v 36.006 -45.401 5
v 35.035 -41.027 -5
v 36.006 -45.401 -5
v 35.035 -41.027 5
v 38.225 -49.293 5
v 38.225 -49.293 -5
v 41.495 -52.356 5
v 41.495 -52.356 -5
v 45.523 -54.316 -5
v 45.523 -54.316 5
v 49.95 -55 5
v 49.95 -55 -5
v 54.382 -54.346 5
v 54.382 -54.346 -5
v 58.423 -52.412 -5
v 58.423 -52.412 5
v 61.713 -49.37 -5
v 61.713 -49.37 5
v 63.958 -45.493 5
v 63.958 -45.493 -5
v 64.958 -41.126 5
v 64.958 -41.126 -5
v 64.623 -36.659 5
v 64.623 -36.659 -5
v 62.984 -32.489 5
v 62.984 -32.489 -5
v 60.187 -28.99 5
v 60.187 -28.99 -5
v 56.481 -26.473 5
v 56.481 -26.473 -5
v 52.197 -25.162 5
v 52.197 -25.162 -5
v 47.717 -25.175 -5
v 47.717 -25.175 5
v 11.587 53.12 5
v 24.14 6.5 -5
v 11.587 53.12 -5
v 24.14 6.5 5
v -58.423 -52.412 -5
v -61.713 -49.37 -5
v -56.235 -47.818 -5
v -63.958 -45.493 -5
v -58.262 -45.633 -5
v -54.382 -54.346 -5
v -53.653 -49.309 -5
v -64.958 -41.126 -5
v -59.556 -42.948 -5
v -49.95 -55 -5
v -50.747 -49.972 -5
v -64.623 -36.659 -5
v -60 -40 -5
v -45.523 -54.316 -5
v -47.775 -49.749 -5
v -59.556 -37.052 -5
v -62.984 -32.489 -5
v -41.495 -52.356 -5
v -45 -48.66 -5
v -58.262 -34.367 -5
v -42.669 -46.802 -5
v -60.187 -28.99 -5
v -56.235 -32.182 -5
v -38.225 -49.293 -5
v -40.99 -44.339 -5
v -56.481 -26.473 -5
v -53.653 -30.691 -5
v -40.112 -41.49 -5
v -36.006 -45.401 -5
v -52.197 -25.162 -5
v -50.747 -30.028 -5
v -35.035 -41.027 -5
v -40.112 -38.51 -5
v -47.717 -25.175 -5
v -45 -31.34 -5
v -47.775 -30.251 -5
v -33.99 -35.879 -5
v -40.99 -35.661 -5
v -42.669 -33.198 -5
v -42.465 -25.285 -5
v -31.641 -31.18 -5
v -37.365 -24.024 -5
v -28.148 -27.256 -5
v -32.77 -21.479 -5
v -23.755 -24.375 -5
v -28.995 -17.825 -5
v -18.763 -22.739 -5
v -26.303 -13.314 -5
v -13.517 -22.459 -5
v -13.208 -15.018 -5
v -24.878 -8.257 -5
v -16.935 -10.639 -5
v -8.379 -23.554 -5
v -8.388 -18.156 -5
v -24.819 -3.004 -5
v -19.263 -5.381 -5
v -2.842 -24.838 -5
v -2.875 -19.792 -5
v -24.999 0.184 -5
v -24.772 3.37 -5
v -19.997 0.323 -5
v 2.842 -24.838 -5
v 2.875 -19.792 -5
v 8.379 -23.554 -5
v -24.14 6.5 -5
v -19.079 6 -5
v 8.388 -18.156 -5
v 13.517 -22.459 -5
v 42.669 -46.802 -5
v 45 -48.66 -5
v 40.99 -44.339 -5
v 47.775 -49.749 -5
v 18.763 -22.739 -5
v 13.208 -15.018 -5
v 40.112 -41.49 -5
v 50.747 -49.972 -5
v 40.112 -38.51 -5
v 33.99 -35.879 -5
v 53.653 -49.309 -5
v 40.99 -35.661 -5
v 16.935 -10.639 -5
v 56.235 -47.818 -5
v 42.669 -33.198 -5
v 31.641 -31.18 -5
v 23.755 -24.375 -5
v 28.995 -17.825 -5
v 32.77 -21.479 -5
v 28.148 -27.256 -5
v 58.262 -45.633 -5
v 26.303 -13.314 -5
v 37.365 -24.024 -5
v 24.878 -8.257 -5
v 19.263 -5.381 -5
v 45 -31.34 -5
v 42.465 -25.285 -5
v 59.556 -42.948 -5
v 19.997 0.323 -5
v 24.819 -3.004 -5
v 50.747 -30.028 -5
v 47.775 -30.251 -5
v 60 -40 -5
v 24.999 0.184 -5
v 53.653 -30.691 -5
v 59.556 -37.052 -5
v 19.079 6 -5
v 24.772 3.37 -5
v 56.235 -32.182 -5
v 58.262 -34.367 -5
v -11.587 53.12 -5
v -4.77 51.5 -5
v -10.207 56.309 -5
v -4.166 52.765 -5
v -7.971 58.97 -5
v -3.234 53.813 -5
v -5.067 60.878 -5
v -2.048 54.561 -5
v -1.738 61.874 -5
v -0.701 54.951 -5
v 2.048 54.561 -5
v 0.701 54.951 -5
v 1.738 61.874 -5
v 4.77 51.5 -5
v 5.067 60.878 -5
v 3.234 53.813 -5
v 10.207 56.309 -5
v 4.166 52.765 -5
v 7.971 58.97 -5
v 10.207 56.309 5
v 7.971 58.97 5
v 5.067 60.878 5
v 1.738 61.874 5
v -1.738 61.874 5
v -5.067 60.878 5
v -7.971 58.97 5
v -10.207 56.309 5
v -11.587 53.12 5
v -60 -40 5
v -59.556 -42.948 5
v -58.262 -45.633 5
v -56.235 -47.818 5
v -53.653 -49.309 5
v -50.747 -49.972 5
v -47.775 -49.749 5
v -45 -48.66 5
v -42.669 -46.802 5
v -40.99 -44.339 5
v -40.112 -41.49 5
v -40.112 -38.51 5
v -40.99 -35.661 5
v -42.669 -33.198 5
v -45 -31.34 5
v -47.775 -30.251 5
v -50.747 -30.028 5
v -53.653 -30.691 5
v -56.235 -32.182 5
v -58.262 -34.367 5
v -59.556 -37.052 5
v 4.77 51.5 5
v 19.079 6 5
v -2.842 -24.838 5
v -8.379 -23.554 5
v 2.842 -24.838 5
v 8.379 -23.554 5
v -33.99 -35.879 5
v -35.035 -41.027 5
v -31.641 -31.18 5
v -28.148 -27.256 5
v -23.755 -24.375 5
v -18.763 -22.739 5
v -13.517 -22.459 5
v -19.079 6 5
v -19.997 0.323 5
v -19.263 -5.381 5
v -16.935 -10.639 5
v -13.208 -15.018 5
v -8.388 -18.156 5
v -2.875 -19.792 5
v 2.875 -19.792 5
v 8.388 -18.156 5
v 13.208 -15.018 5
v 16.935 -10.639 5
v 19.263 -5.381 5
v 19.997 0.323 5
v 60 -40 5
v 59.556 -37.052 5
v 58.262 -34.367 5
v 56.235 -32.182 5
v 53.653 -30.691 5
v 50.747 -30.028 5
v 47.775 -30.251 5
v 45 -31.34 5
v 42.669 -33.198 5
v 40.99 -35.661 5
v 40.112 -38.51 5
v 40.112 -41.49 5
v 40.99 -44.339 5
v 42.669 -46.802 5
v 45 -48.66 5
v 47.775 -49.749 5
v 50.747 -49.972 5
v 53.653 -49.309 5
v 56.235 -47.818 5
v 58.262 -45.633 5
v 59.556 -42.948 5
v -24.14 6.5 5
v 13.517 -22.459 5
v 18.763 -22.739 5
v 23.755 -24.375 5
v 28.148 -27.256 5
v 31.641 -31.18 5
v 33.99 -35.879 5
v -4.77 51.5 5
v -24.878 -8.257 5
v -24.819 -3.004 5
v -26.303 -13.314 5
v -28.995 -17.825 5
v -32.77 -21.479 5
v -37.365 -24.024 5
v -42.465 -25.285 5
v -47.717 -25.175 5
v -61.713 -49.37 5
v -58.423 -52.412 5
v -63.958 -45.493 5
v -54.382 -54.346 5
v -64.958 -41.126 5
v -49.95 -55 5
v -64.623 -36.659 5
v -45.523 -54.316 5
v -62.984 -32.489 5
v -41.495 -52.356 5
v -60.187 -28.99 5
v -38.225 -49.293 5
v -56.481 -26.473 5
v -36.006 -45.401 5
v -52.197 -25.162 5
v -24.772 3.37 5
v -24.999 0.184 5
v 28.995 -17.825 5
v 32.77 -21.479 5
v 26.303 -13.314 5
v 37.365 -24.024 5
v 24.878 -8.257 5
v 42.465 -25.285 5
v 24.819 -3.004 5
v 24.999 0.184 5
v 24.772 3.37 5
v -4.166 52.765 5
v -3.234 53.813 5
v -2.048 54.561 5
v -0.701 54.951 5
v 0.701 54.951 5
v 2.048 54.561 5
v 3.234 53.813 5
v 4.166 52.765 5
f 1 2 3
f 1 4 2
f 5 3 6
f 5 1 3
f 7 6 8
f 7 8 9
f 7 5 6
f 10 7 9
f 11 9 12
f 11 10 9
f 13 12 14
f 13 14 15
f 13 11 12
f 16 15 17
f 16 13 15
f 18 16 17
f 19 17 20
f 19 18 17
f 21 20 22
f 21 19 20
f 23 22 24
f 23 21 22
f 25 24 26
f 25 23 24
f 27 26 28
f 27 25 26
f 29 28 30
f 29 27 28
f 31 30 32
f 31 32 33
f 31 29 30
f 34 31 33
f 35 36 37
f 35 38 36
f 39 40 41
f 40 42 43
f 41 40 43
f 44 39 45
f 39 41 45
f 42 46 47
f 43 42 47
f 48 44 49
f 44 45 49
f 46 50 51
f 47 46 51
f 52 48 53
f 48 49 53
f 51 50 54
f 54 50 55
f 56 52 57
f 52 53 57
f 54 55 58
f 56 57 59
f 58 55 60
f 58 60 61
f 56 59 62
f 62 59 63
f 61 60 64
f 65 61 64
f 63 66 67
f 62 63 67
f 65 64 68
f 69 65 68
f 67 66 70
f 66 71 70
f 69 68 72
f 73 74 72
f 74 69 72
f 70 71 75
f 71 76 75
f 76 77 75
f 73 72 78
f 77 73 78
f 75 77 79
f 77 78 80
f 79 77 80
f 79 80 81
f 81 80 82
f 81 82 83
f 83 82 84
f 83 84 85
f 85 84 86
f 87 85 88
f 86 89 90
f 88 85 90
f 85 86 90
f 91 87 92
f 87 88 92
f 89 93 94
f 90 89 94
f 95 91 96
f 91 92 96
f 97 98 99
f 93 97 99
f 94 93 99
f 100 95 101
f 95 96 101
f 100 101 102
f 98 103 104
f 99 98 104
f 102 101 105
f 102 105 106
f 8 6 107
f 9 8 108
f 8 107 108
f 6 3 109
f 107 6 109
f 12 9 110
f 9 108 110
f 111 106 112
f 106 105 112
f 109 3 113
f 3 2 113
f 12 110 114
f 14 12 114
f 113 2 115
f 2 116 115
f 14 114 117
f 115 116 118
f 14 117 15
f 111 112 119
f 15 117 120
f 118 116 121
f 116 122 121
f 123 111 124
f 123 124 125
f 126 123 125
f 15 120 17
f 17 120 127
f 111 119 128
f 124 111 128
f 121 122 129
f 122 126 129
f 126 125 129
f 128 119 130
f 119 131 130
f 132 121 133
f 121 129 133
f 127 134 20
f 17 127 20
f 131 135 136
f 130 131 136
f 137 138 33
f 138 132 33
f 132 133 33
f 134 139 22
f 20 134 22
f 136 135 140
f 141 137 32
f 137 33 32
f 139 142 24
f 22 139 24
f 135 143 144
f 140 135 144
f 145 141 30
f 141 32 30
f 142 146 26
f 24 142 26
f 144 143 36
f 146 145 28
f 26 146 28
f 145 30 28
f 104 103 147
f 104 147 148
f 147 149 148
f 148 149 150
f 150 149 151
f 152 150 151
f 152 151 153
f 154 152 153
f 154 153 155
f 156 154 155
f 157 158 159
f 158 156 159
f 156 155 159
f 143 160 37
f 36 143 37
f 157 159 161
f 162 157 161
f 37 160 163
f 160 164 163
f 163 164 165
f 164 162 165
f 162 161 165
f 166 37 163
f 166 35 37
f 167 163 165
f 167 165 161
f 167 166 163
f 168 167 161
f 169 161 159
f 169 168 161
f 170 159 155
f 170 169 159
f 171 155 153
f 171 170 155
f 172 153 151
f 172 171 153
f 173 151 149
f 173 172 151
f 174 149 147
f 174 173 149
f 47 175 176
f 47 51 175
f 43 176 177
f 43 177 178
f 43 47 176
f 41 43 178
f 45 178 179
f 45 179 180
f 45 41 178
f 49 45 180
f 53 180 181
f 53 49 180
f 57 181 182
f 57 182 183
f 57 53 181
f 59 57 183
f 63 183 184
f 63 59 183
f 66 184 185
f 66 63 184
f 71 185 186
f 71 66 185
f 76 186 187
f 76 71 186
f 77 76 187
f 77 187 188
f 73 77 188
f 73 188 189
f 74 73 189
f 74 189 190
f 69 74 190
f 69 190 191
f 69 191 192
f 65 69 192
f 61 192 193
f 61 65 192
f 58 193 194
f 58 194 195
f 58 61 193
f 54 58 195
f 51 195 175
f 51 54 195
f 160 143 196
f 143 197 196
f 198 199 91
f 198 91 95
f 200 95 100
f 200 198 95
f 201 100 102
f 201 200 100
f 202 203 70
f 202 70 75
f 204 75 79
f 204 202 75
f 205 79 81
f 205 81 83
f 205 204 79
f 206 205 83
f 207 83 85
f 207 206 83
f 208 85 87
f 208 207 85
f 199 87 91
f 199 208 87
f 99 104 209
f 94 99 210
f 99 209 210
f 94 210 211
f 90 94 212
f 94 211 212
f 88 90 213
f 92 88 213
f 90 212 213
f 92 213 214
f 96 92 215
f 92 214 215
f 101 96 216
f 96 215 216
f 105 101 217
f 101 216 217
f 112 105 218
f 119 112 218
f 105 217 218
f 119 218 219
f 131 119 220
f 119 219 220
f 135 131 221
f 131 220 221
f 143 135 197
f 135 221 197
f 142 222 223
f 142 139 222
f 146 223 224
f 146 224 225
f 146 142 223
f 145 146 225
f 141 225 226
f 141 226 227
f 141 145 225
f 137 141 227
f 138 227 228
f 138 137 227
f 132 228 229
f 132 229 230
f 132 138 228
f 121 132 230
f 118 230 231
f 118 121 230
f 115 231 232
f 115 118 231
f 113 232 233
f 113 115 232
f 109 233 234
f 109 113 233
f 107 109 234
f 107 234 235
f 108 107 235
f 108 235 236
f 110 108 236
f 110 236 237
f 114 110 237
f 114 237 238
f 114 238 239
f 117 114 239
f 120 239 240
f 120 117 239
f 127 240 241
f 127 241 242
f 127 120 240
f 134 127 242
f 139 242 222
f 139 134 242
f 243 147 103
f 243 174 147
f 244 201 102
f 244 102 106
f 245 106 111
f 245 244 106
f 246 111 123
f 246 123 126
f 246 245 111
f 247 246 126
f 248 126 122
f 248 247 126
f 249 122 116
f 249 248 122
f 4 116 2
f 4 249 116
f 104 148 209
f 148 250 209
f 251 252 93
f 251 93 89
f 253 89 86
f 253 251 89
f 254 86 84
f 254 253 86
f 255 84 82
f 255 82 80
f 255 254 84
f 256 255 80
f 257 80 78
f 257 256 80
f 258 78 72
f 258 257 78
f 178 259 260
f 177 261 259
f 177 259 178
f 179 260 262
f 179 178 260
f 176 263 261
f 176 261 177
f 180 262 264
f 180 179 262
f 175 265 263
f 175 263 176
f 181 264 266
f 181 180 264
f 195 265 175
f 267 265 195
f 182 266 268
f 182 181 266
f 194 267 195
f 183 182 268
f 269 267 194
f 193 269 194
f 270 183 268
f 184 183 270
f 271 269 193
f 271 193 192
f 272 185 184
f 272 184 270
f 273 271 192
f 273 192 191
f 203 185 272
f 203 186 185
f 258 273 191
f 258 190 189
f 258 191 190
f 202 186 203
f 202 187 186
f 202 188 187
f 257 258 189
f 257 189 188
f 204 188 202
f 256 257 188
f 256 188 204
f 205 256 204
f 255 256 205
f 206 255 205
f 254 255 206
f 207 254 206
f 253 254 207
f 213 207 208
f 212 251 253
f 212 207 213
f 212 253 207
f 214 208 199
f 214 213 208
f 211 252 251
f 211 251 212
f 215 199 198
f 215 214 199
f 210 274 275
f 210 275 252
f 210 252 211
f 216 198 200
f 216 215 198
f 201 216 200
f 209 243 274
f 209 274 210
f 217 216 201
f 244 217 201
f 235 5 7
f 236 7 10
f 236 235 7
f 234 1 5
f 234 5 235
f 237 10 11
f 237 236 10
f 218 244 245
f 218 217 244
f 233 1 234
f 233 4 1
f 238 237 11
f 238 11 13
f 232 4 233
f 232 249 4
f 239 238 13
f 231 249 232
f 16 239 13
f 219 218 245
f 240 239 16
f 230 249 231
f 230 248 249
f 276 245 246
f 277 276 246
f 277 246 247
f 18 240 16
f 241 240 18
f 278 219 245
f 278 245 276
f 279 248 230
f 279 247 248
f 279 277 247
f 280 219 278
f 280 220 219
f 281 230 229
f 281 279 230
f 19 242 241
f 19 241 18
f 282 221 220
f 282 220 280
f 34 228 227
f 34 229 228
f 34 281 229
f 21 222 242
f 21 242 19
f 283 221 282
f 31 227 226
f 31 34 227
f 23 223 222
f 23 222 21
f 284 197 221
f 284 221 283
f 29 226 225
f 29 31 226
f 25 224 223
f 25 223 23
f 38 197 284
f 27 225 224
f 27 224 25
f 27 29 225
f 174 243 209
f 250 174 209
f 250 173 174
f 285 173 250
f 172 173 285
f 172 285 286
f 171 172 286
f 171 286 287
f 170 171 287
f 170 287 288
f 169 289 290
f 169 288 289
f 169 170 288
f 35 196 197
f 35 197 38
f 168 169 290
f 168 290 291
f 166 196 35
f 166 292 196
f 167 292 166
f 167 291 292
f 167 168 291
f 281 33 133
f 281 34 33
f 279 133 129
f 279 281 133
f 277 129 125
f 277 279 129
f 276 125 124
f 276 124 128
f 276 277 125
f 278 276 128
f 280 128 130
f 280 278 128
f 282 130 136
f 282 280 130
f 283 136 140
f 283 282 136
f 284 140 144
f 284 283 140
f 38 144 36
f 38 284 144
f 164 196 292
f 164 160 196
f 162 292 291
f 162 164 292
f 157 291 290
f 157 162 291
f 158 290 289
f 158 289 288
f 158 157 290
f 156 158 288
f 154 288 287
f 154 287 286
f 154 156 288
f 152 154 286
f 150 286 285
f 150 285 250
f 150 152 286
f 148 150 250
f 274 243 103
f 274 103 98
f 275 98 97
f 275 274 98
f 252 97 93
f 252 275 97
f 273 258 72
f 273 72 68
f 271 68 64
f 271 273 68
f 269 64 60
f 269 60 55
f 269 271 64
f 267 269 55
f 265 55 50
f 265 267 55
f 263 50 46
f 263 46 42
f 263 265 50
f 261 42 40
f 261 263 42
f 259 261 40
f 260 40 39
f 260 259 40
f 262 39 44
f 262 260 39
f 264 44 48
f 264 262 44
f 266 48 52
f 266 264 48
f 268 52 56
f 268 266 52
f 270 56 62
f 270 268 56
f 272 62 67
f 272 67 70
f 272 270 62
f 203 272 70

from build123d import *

# Parameters (mm, degrees)
SKETCH1_R           = 10
BOSS_EXTRUDE1_DEPTH = 5


with BuildPart() as part:
    # Sketch1 → Boss-Extrude1 (new, symmetric)
    with BuildSketch(Plane.XY):
        with BuildLine():
            Line((-11.587303396, 53.12), (-24.140215409, 6.5))
            ThreePointArc((-24.140215409, 6.5), (-24.936514863, 1.780512988), (-24.81883517, -3.004233816))
            ThreePointArc((-24.81883517, -3.004233816), (-30.762049538, -19.776348187), (-47.717387131, -25.174694658))
            ThreePointArc((-47.717387131, -25.174694658), (-61.713032142, -49.370425713), (-35.03522611, -41.027395935))
            ThreePointArc((-35.03522611, -41.027395935), (-26.046643252, -25.670606045), (-8.378996809, -23.554031767))
            ThreePointArc((-8.378996809, -23.554031767), (0, -25), (8.378996809, -23.554031767))
            ThreePointArc((8.378996809, -23.554031767), (26.046643252, -25.670606045), (35.03522611, -41.027395935))
            ThreePointArc((35.03522611, -41.027395935), (61.713032142, -49.370425713), (47.717387131, -25.174694658))
            ThreePointArc((47.717387131, -25.174694658), (30.762049538, -19.776348187), (24.81883517, -3.004233816))
            ThreePointArc((24.81883517, -3.004233816), (24.936514863, 1.780512988), (24.140215409, 6.5))
            Line((24.140215409, 6.5), (11.587303396, 53.12))
            ThreePointArc((11.587303396, 53.12), (0, 62), (-11.587303396, 53.12))
        make_face()
        with Locations((50, -40)):
            Circle(SKETCH1_R, mode=Mode.SUBTRACT)
        with Locations(Location((-50, -40, 0), (0, 0, 180))):
            Circle(SKETCH1_R, mode=Mode.SUBTRACT)
        with BuildLine():
            Line((-4.769696007, 51.5), (-19.078784028, 6))
            ThreePointArc((-19.078784028, 6), (0, -20), (19.078784028, 6))
            Line((19.078784028, 6), (4.769696007, 51.5))
            ThreePointArc((4.769696007, 51.5), (0, 55), (-4.769696007, 51.5))
        make_face(mode=Mode.SUBTRACT)
    extrude(amount=BOSS_EXTRUDE1_DEPTH, both=True)


solid = part.part
